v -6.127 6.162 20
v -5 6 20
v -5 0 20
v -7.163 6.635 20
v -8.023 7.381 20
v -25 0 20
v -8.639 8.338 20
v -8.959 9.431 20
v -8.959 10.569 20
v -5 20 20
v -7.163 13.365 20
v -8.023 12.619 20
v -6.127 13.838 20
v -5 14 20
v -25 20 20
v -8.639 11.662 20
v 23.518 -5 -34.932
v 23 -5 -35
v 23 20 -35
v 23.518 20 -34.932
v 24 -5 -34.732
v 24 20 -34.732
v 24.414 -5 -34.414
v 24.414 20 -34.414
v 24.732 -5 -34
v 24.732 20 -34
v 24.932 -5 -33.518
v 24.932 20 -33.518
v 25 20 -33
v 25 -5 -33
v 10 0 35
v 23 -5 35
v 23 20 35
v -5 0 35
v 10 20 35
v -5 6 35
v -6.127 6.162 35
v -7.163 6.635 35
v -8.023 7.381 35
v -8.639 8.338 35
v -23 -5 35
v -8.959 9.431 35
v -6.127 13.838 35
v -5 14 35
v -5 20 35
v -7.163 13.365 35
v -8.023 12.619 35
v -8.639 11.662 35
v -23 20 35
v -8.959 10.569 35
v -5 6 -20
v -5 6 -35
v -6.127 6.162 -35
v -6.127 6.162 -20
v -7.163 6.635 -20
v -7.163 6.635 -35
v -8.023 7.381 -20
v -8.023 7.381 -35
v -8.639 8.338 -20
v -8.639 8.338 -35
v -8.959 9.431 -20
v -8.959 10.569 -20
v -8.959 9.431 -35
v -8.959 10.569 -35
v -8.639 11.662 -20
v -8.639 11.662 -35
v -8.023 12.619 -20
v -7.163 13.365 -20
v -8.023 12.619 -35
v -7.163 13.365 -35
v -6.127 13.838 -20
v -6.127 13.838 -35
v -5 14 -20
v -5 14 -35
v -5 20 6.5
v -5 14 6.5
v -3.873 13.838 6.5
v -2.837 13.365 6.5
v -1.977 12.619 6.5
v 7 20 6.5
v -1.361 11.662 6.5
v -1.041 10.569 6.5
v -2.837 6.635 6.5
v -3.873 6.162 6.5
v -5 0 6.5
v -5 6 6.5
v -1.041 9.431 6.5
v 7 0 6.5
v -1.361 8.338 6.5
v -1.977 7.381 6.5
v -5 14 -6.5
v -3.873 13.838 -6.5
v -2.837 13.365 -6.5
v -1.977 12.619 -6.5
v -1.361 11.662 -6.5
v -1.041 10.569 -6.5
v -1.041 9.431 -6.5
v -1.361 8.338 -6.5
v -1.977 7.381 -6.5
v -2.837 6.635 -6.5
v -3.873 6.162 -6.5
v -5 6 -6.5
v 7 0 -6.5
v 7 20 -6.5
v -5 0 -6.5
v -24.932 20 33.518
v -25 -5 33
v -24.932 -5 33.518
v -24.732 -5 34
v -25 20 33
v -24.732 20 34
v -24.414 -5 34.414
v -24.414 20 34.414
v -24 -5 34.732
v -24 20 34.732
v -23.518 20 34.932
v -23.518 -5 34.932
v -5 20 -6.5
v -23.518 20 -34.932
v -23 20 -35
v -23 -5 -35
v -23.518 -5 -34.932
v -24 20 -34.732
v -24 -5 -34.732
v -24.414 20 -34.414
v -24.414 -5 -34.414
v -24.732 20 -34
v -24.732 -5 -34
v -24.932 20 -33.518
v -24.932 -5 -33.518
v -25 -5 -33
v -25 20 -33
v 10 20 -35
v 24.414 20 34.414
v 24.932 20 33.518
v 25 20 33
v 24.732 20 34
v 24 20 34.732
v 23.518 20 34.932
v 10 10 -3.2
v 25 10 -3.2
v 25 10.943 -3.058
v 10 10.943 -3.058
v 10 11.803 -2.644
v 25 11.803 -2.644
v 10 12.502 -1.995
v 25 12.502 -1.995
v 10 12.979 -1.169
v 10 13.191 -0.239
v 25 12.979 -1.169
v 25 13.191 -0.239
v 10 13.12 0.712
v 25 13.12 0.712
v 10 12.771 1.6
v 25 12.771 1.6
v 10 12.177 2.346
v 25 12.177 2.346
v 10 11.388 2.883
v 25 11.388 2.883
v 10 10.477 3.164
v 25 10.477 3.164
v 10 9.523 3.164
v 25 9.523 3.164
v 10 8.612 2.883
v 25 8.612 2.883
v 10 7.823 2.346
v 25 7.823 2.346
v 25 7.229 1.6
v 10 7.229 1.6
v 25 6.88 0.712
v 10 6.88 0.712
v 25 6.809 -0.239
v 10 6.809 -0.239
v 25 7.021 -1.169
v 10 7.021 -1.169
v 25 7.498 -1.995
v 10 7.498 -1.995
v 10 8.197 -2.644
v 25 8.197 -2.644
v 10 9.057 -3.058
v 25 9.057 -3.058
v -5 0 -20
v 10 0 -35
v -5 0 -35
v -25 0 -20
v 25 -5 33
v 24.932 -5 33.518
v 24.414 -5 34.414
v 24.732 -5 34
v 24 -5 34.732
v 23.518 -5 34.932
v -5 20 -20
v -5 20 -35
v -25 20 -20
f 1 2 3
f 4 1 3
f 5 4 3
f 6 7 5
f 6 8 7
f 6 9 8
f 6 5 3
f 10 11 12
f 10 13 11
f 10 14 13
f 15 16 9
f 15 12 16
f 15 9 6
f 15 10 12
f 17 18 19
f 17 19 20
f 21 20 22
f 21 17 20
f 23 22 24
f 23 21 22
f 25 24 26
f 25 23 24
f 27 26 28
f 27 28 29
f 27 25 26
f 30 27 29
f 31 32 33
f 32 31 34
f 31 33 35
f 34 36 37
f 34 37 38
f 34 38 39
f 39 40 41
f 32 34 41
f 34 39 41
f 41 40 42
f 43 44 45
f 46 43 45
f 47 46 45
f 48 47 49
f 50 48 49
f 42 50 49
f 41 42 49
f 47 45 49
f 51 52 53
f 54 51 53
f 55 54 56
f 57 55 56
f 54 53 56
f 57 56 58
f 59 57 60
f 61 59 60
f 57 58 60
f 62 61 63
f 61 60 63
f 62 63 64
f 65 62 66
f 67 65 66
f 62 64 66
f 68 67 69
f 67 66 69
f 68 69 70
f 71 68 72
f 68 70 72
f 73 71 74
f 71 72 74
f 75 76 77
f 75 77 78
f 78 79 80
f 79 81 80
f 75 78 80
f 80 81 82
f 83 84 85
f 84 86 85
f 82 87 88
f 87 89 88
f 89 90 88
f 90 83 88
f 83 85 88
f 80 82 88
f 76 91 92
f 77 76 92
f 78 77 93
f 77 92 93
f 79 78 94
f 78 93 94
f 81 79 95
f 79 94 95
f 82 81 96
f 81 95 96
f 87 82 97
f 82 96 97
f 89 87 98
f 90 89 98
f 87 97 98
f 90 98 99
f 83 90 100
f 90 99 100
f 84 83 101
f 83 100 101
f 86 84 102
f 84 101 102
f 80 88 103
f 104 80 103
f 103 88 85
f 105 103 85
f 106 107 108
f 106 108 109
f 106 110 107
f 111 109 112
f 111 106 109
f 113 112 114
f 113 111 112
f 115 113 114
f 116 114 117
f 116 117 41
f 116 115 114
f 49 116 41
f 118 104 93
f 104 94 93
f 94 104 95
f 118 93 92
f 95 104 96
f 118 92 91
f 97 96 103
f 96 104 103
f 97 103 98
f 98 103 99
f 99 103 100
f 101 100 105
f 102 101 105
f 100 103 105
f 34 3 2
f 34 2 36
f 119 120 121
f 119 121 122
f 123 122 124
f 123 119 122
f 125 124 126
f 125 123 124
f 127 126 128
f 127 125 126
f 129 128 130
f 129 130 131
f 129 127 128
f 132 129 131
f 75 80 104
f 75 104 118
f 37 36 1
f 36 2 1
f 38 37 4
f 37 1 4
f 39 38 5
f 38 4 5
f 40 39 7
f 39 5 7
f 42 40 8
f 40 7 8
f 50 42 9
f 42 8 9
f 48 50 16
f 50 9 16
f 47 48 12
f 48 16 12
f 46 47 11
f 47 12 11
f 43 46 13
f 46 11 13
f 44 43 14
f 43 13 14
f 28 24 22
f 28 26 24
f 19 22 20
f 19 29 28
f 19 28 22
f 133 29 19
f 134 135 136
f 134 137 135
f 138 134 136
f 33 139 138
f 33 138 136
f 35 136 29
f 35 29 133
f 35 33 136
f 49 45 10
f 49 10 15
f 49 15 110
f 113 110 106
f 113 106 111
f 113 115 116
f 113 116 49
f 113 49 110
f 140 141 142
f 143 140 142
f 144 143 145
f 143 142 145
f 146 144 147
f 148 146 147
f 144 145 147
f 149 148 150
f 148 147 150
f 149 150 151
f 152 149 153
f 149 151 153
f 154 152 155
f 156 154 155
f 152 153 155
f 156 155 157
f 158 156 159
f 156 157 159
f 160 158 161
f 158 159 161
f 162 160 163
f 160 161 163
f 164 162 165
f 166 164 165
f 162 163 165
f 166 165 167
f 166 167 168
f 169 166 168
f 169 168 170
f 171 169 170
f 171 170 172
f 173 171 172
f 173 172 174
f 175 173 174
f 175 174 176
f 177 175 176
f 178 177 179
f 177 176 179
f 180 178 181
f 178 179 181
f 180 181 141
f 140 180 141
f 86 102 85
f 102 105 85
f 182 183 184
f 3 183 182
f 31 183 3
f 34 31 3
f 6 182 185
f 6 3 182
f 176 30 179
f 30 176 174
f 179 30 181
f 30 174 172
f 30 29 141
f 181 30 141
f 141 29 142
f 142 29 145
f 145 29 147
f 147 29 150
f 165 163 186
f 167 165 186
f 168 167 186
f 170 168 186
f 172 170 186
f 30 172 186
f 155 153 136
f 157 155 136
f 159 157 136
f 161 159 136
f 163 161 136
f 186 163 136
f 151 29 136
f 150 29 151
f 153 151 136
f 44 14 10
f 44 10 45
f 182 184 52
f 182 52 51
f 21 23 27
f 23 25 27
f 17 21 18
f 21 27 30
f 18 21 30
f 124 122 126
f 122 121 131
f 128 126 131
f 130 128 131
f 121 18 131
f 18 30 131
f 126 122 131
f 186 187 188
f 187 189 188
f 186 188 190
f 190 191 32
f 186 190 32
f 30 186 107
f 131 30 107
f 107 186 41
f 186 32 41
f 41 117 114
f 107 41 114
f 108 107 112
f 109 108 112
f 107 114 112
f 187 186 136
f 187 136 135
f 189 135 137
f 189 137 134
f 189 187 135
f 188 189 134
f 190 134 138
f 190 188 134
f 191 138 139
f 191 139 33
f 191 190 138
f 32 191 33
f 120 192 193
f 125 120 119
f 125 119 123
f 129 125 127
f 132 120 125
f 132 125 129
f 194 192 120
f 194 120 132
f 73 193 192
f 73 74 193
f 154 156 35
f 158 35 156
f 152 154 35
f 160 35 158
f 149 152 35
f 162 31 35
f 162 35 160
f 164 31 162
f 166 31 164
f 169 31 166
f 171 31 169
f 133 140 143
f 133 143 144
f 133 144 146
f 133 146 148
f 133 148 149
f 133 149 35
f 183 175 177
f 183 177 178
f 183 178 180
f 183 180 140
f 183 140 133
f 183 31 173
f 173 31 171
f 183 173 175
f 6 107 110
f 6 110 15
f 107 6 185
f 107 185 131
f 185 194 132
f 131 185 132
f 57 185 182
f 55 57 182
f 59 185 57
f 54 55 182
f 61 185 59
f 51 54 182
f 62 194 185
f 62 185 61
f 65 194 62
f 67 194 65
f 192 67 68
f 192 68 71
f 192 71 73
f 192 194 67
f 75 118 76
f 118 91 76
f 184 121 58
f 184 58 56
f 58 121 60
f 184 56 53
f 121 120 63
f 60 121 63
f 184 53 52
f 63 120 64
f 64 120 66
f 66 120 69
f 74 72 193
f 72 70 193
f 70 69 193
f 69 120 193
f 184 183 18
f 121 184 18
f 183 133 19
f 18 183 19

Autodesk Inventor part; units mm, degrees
ref_plane "YZ Plane" through (0, 0, 0) normal (1, 0, 0) x (0, 1, 0)
ref_plane "XZ Plane" through (0, 0, 0) normal (0, 1, 0) x (-1, 0, 0)
ref_plane "XY Plane" through (0, 0, 0) normal (0, 0, 1) x (1, 0, 0)
sketch "Sketch1" plane through (0, 0, 0) normal (0, 1, 0) x (-1, 0, 0)
  line L0 (25, -35) -> (-25, -35)
  line L1 (-25, -35) -> (-25, 35)
  line L2 (-25, 35) -> (25, 35)
  line L3 (25, 35) -> (25, -35)
  line L4 (25, -35) -> (5, -35)
  line L5 (5, -35) -> (5, 35)
  line L6 (5, 35) -> (25, 35)
  line L7 (25, 35) -> (25, -35)
  line L8 (-10, -35) -> (-25, -35)
  line L9 (-25, -35) -> (-25, 35)
  line L10 (-25, 35) -> (-10, 35)
  line L11 (-10, 35) -> (-10, -35)
  line L12 (5, 6.5) -> (-7, 6.5)
  line L13 (-7, 6.5) -> (-7, -6.5)
  line L14 (-7, -6.5) -> (5, -6.5)
  line L15 (5, -6.5) -> (5, 6.5)
  point P0 (0, 0)
  point P1 (-25, 0)
  point P2 (0, -35)
  point P3 (5, 0)
  point P4 (5, -35)
  point P5 (-10, -7.5)
  point P6 (5, -6.5)
  point P7 (5, 6.5)
  point P8 (-10, 7.5)
  dimension "d0" = 70
  dimension "d1" = 50
  dimension "d2" = 20
  dimension "d3" = 15
  dimension "d4" = 13
  dimension "d16" = 3
extrude "Extrusion1" add sketch "Sketch1" against normal blind 5
extrude "Extrusion2" add sketch "Sketch1" along normal blind 20 contours L0 L5 L2 L3 | L0 L1 L2 L11
extrude "Extrusion3" add sketch "Sketch1" along normal blind 20 separate body contours L14 L13 L12 L5
sketch "Sketch2" plane through (25, -5, -35) normal (0, 0, -1) x (-1, 0, 0)
  line L0 (30, 5) -> (30, 25) projected
  circle A0 centre (30, 15) radius 4
  point P0 (25, 5)
  dimension "d11" = 8
extrude "Extrusion4" cut sketch "Sketch2" against normal up to surface (70 mm away) bodies 1
extrude "Extrusion5" cut sketch "Sketch2" against normal up to surface (70 mm away) bodies 2
sketch "Sketch3" plane through (0, 20, 0) normal (0, 1, 0) x (1, 0, 0)
  line L0 (-25, -35) -> (-25, 35) projected
  line L1 (-5, -35) -> (-5, 35) projected
  line L2 (-25, 20) -> (-5, 20)
  line L3 (-5, 20) -> (-5, -20)
  line L4 (-5, -20) -> (-25, -20)
  line L5 (-25, -20) -> (-25, 20)
  point P0 (0, 0)
  point P1 (-25, 0)
  point P2 (-5, 20)
  dimension "d17" = 40
extrude "Extrusion6" cut sketch "Sketch3" against normal up to surface (20 mm away) bodies 1
sketch "Sketch4" plane through (25, -5, 35) normal (1, 0, 0) x (0, 0, -1)
  line L0 (35, 5) -> (35, 25) construction
  line L1 (28.5, 25) -> (41.5, 25) construction
  circle A0 centre (35, 15) radius 3.2
  dimension "d20" = 6.4
extrude "Extrusion7" cut sketch "Sketch4" against normal up to surface (15 mm away) bodies 1
fillet "Fillet1" radius 2 4 edges at (-25, 7.5, 35) (25, 7.5, 35) (-25, 7.5, -35) (25, 7.5, -35)
properties part number "RodBender_3DPrint"
